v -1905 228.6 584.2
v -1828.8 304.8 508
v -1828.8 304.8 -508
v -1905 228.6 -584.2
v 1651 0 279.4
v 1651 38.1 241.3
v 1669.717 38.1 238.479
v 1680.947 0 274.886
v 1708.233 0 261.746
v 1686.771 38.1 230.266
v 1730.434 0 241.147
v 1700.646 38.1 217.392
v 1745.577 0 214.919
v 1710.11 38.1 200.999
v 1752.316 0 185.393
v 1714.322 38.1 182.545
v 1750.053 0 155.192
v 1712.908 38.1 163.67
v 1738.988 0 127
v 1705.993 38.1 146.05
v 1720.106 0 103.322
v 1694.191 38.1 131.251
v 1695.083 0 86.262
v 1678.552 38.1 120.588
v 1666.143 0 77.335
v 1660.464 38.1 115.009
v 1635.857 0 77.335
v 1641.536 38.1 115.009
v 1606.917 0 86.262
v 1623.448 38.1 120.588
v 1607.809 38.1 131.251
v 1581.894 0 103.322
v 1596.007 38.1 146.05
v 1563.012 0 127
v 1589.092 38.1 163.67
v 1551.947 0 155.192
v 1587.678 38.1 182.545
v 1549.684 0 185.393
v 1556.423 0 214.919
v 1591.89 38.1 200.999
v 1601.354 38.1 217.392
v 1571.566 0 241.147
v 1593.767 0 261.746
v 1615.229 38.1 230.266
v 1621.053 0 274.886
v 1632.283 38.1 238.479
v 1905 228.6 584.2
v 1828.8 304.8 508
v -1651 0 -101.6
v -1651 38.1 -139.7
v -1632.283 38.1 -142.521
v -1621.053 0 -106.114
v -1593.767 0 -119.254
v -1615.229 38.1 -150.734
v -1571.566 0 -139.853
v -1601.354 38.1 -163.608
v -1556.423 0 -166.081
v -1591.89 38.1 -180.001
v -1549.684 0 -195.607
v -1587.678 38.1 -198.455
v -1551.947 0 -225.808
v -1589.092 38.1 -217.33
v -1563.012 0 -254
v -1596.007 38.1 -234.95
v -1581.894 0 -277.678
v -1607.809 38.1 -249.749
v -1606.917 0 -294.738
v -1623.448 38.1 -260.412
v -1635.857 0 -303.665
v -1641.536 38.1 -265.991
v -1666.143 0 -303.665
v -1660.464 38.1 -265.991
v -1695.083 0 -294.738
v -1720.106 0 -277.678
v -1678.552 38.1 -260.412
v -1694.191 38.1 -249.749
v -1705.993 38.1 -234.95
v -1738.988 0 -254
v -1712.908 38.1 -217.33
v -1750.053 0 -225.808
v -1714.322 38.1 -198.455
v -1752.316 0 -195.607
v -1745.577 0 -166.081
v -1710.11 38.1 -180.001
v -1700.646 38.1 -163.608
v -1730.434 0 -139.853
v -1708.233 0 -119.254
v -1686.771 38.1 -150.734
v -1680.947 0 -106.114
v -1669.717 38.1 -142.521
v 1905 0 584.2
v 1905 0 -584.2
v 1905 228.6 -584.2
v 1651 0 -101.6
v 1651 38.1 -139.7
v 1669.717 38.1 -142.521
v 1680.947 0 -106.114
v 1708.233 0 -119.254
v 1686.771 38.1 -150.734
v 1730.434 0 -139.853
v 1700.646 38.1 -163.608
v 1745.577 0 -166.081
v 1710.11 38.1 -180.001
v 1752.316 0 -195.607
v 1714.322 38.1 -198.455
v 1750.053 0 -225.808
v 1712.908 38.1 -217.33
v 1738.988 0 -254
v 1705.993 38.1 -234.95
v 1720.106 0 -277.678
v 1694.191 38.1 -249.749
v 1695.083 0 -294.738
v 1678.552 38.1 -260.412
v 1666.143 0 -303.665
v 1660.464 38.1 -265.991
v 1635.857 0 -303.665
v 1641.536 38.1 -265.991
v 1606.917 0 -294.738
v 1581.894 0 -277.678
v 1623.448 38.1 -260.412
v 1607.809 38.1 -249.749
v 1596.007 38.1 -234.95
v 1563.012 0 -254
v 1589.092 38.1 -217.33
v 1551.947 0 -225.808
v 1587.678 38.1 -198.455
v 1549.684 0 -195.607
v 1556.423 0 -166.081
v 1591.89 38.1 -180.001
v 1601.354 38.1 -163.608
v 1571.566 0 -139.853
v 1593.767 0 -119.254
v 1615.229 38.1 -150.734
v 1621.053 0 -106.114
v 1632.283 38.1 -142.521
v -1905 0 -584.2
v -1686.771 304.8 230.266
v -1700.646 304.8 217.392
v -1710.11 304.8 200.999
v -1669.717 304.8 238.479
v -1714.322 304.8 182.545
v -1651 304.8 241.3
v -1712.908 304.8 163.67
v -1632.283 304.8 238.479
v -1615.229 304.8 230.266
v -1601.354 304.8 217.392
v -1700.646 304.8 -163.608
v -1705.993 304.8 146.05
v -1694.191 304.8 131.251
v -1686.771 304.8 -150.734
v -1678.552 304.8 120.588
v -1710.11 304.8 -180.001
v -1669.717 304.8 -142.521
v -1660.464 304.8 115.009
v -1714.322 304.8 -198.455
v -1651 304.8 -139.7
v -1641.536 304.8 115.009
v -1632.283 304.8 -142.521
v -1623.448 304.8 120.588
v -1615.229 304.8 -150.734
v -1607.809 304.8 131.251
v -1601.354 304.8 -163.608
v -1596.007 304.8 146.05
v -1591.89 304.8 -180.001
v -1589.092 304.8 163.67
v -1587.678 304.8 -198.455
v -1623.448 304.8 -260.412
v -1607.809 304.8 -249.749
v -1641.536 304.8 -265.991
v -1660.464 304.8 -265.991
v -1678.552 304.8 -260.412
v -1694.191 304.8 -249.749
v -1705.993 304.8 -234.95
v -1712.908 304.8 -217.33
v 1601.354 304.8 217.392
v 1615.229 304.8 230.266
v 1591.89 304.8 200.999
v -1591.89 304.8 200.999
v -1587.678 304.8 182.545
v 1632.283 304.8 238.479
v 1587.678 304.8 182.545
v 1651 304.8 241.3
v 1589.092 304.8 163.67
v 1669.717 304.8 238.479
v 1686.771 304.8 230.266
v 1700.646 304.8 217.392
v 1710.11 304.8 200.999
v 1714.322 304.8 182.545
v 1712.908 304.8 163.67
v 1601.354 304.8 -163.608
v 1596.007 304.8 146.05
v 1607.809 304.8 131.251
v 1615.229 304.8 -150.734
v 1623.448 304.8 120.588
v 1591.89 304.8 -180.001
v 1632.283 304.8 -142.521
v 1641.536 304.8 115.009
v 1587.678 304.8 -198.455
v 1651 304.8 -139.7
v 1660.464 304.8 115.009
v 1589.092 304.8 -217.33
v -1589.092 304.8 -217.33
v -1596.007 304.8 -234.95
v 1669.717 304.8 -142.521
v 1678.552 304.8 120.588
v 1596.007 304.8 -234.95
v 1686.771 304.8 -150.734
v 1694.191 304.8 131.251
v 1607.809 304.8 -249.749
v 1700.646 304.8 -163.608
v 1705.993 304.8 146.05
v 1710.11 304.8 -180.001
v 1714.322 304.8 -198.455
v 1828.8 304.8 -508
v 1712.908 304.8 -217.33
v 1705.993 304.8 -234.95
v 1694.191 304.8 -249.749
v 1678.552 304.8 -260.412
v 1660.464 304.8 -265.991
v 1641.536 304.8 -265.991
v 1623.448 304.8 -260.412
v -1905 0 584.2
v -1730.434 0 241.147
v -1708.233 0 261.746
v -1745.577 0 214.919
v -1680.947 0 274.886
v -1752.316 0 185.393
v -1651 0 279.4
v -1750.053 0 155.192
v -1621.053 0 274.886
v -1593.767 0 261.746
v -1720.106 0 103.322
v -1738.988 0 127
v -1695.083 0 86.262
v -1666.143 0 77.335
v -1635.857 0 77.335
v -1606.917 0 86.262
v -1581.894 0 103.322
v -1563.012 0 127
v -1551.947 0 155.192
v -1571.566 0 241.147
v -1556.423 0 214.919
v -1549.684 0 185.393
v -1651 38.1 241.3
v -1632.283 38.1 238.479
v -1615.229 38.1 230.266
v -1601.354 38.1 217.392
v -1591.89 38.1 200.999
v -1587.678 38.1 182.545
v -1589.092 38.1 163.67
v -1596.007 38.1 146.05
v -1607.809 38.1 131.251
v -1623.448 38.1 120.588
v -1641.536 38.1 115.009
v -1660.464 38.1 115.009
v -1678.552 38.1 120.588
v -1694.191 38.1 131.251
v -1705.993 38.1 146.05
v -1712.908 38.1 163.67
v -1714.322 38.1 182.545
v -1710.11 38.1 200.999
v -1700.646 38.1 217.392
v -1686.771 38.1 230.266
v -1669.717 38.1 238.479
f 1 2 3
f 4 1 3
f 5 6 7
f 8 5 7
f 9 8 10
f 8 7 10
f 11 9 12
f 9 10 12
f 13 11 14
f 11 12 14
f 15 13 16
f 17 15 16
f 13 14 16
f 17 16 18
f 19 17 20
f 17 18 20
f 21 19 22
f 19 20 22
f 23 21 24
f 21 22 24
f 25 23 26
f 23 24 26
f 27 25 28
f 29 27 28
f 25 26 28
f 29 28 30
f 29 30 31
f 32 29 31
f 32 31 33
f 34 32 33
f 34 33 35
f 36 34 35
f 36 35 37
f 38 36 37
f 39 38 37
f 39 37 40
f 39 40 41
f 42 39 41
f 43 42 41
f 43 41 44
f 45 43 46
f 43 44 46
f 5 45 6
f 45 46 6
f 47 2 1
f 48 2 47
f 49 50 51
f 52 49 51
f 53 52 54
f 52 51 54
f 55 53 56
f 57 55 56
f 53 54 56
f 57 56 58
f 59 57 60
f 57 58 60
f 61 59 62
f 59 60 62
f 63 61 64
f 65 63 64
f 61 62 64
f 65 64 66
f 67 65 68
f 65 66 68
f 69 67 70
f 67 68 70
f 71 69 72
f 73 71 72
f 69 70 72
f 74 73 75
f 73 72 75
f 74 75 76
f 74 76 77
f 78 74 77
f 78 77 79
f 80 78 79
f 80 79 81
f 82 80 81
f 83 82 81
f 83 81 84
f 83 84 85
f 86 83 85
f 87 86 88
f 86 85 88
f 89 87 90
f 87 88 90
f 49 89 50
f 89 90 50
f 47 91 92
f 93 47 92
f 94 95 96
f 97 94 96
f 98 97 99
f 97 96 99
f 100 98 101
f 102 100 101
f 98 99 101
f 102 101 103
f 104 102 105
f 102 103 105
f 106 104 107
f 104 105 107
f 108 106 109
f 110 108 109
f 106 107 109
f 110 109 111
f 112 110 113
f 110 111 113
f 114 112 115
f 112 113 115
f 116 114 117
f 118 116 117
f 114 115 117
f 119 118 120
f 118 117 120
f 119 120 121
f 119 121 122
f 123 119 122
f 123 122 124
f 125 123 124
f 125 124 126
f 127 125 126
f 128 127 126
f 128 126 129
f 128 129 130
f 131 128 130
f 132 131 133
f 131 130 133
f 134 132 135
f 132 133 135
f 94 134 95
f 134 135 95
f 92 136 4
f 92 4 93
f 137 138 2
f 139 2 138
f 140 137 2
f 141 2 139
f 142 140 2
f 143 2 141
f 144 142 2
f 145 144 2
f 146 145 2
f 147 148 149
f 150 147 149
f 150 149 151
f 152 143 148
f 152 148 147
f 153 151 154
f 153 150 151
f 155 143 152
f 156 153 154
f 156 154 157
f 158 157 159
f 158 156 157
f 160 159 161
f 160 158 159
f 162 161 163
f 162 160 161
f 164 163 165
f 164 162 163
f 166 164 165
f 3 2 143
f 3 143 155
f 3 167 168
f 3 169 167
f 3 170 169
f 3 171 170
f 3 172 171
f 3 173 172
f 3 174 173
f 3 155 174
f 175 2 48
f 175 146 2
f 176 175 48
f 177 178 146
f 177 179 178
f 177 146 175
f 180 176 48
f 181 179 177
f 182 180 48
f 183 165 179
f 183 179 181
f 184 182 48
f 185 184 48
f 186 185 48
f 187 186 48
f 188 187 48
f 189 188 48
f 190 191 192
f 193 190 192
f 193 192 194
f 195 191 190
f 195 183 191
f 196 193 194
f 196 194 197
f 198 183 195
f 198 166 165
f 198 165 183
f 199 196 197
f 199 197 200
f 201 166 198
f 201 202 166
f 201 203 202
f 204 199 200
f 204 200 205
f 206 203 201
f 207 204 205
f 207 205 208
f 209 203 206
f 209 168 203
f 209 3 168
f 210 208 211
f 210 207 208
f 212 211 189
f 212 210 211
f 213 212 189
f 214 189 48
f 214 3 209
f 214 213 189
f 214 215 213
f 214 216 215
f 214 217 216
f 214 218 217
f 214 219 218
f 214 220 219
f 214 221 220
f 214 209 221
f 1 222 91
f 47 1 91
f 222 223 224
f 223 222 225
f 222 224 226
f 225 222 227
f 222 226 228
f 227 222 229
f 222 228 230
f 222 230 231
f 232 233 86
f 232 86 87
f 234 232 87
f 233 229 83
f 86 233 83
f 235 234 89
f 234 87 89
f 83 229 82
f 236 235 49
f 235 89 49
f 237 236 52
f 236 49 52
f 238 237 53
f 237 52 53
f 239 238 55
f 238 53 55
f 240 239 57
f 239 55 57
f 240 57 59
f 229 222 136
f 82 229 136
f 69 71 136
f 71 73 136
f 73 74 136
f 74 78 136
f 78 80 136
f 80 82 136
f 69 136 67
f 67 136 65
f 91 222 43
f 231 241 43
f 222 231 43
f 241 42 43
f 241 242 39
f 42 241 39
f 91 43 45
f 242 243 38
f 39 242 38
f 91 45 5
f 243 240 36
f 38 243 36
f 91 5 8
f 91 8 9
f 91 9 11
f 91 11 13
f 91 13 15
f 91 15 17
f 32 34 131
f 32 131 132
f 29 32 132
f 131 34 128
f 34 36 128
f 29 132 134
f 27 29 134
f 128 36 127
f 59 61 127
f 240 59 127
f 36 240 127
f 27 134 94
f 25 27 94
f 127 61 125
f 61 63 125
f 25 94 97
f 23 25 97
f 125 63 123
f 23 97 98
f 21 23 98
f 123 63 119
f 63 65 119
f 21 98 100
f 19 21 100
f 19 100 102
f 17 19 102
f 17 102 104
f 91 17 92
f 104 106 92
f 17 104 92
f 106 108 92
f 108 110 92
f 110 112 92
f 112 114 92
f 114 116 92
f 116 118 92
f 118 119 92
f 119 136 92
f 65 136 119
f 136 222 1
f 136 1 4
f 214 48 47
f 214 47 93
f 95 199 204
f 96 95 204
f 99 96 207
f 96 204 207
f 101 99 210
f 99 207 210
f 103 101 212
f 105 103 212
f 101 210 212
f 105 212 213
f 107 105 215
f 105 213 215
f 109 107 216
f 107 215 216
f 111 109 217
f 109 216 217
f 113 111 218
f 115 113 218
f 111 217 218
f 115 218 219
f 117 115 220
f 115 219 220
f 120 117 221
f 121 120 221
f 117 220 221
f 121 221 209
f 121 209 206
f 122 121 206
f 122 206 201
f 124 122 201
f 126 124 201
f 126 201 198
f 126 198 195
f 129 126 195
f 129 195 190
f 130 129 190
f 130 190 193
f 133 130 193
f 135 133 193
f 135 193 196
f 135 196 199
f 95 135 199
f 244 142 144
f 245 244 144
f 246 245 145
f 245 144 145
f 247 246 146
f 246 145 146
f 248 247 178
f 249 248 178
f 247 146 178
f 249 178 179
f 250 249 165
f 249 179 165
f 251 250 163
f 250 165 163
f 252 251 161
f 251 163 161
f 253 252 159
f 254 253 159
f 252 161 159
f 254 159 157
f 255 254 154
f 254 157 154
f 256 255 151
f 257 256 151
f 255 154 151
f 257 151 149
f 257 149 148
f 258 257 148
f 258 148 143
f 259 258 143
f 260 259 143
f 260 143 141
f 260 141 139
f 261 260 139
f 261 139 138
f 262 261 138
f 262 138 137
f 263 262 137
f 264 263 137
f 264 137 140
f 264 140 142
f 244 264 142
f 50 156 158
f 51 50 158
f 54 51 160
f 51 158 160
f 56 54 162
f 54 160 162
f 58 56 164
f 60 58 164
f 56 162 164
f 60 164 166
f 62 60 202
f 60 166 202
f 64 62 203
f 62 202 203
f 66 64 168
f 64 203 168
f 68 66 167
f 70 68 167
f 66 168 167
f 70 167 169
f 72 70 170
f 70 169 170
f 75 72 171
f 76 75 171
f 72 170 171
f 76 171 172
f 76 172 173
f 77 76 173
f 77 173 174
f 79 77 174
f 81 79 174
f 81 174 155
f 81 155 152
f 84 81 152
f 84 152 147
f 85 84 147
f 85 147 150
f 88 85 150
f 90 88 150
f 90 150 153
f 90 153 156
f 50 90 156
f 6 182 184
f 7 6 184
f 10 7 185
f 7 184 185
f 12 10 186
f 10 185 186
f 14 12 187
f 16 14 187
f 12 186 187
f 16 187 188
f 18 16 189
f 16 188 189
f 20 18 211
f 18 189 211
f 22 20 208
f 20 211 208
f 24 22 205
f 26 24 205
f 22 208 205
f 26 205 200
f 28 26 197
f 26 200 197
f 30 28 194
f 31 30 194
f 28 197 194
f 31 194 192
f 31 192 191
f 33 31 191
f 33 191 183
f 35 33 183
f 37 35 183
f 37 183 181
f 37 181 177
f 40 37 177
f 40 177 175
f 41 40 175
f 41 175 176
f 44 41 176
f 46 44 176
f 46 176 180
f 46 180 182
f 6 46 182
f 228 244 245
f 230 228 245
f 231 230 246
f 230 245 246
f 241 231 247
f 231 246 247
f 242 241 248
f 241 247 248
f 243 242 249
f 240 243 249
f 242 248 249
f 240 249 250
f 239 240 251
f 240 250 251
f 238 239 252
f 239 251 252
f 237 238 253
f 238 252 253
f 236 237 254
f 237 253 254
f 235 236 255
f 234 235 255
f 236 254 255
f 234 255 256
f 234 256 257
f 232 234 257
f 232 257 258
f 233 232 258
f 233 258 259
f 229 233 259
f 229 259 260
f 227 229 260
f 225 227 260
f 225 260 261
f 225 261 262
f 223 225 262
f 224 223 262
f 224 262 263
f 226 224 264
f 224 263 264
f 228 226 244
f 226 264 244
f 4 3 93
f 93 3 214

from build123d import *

# Parameters (mm, degrees)
SKETCH1_W           = 3810
SKETCH1_H           = 1168.4
BOSS_EXTRUDE1_DEPTH = 304.8
CHAMFER1_SIZE       = 76.2
SKETCH3_R           = 63.5
CUT_EXTRUDE1_DEPTH  = 305.8
CHAMFER2_SIZE       = 38.1


with BuildPart() as part:
    # Sketch1 → Boss-Extrude1 (new body)
    with BuildSketch(Plane(origin=(0, 0, 0), x_dir=(1, 0, 0), z_dir=(0, 1, 0))):
        Rectangle(SKETCH1_W, SKETCH1_H)
    extrude(amount=BOSS_EXTRUDE1_DEPTH)

    # Chamfer1
    chamfer1_edges = [part.edges().sort_by_distance(p)[0] for p in [
        (-1905, 304.8, 0),
        (0, 304.8, 584.2),
        (1905, 304.8, 0),
        (0, 304.8, -584.2),
    ]]
    chamfer(chamfer1_edges, length=CHAMFER1_SIZE)

    # Sketch3 → Cut-Extrude1 (cut, through all)
    with BuildSketch(Plane(origin=(0, 304.8, 0), x_dir=(1, 0, 0), z_dir=(0, 1, 0))):
        with Locations(Location((-1651, -177.8, 0), (0, 0, 270))):  # turned: the seam where the file's is
            Circle(SKETCH3_R)
        with Locations(Location((-1651, 203.2, 0), (0, 0, 270))):  # turned: the seam where the file's is
            Circle(SKETCH3_R)
        with Locations(Location((1651, 203.2, 0), (0, 0, 270))):  # turned: the seam where the file's is
            Circle(SKETCH3_R)
        with Locations(Location((1651, -177.8, 0), (0, 0, 270))):  # turned: the seam where the file's is
            Circle(SKETCH3_R)
    extrude(amount=-CUT_EXTRUDE1_DEPTH, mode=Mode.SUBTRACT)

    # Chamfer2
    chamfer2_edges = [part.edges().sort_by_distance(p)[0] for p in [
        (-1651, 0, 114.3),
        (-1651, 0, -266.7),
        (1651, 0, -266.7),
        (1651, 0, 114.3),
    ]]
    chamfer(chamfer2_edges, length=CHAMFER2_SIZE)


solid = part.part
